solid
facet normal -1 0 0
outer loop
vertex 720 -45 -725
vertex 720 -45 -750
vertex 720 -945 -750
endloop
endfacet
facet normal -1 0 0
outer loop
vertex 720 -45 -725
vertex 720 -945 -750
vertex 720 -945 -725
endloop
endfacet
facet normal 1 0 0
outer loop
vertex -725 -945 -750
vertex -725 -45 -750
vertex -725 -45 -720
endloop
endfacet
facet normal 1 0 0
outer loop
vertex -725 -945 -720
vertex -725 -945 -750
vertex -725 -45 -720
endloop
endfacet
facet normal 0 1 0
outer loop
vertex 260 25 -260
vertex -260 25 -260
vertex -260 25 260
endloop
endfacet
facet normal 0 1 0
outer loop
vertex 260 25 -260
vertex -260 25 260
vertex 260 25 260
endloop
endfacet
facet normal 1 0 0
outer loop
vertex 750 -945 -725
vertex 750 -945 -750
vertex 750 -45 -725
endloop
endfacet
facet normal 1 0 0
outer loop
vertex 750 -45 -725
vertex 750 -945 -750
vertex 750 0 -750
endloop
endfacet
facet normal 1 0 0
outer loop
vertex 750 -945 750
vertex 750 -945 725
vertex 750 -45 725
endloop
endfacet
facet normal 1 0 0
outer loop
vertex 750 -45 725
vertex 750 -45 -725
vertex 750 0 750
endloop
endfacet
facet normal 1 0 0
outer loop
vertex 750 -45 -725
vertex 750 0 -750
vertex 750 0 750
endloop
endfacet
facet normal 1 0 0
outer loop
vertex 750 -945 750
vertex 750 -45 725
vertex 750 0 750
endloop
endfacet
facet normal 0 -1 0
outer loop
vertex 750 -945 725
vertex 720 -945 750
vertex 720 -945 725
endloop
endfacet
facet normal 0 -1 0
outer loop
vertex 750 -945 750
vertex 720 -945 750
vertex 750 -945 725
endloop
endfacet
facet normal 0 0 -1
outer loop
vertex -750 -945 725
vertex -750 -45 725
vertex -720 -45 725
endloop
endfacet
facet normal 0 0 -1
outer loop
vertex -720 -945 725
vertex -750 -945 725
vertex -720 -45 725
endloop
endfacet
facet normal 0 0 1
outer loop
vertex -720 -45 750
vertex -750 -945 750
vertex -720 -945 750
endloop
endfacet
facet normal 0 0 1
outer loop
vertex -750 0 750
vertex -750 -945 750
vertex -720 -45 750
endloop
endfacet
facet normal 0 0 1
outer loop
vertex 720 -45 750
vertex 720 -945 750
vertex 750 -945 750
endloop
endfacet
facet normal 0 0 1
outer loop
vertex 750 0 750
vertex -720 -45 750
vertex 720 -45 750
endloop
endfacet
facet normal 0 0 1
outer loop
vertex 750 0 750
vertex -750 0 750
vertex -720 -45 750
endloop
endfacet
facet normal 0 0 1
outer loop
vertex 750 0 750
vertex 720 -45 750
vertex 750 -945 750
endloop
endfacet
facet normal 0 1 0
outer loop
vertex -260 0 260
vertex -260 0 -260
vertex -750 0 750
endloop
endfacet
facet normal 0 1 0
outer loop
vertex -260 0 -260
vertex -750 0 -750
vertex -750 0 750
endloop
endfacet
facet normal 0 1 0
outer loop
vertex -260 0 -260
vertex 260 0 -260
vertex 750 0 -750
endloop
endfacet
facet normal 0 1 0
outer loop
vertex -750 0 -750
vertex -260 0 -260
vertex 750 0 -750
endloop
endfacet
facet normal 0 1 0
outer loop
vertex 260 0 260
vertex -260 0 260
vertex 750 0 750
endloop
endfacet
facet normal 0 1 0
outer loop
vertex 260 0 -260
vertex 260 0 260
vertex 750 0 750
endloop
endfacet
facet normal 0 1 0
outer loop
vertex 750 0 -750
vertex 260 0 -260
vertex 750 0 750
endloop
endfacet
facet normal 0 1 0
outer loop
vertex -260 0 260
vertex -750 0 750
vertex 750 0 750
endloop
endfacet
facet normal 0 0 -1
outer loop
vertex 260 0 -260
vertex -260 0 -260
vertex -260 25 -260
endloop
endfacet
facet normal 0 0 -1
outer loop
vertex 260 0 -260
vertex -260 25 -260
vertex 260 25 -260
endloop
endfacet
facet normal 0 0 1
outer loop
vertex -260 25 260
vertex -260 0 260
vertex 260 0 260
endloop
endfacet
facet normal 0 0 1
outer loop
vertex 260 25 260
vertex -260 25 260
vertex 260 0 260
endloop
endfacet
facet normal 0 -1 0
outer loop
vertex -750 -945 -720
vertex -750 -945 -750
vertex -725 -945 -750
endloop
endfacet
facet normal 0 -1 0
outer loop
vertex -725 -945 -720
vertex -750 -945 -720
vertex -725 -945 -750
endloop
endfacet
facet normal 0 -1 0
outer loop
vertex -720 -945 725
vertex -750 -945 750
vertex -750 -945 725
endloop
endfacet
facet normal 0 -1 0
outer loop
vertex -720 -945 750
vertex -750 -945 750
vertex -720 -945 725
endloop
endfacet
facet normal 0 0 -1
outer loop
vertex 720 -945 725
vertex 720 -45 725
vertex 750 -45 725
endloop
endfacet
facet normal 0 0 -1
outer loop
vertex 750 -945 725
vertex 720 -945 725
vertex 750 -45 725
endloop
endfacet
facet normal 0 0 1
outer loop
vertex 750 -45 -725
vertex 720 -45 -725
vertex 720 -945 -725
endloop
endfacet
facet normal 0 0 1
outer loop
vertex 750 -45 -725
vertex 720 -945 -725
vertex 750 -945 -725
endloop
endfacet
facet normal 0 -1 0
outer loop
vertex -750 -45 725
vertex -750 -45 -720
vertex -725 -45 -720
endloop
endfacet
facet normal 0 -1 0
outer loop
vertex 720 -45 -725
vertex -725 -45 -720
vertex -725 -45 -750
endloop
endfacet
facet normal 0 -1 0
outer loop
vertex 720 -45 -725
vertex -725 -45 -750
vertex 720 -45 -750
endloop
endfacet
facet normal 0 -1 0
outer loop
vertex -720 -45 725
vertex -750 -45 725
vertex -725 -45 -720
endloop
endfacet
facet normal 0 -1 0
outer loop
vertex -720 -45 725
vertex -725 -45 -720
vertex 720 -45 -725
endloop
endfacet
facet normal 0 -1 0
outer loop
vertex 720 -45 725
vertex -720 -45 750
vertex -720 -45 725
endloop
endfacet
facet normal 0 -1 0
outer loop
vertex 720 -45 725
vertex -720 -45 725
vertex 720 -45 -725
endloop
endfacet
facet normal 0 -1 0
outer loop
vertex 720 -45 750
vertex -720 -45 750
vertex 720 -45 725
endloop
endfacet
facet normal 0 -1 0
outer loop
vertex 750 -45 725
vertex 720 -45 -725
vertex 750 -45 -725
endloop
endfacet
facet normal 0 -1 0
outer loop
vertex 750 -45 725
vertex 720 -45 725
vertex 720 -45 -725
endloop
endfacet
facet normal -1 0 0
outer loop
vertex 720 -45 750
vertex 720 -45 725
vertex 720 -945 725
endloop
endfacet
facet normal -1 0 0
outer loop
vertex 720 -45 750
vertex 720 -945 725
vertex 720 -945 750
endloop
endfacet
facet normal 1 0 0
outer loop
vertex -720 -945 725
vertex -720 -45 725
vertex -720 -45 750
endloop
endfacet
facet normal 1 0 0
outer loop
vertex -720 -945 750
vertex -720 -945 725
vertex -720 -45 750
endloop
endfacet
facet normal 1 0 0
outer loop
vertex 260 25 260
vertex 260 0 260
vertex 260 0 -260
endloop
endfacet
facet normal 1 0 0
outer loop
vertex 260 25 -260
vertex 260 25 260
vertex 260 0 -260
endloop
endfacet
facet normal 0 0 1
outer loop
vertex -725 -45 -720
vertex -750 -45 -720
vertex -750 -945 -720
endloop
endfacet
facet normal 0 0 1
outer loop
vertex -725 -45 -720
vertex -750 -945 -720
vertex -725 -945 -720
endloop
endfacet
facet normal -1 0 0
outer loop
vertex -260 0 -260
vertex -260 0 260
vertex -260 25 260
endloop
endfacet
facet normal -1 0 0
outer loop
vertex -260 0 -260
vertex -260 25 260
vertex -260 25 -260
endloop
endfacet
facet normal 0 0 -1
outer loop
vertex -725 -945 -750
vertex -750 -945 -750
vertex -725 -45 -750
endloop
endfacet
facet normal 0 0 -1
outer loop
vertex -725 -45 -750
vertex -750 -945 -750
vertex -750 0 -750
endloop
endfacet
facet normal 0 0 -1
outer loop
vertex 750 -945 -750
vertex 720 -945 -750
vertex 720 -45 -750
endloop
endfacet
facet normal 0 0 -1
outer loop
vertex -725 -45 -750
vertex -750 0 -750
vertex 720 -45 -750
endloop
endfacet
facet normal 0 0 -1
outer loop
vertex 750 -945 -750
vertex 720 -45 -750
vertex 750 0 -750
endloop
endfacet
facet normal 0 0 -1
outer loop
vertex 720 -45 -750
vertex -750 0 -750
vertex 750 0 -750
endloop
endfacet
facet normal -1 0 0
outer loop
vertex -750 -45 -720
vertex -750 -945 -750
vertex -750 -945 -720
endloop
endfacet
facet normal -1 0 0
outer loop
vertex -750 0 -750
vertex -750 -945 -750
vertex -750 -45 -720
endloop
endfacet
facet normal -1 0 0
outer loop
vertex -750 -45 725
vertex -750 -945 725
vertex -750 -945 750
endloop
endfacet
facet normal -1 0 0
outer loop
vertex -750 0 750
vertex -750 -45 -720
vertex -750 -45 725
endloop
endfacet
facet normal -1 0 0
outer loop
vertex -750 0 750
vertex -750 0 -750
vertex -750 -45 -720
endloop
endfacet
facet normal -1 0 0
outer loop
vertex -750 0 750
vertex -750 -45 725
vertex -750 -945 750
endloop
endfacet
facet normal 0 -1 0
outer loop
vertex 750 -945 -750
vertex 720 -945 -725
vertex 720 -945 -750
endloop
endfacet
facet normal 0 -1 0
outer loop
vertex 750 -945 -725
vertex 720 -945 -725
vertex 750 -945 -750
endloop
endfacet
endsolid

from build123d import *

# Parameters (mm, degrees)
SKETCH1_W           = 520
SKETCH1_H           = 520
BOSS_EXTRUDE1_DEPTH = 25
SKETCH2_W           = 1500
SKETCH2_H           = 1500
BOSS_EXTRUDE2_DEPTH = 45
SKETCH3_W           = 30
SKETCH3_H           = 25
BOSS_EXTRUDE3_DEPTH = 900
SKETCH4_W           = 30
SKETCH4_H           = 25
BOSS_EXTRUDE4_DEPTH = 900
SKETCH5_W           = 30
SKETCH5_H           = 25
BOSS_EXTRUDE5_DEPTH = 900
SKETCH6_W           = 25
SKETCH6_H           = 30
BOSS_EXTRUDE6_DEPTH = 900


with BuildPart() as part:
    # Sketch1 → Boss-Extrude1 (new body)
    with BuildSketch(Plane(origin=(0, 0, 0), x_dir=(1, 0, 0), z_dir=(0, 1, 0))):
        Rectangle(SKETCH1_W, SKETCH1_H)
    extrude(amount=BOSS_EXTRUDE1_DEPTH)

    # Sketch2 → Boss-Extrude2 (add)
    with BuildSketch(Plane.XZ):
        Rectangle(SKETCH2_W, SKETCH2_H)
    extrude(amount=BOSS_EXTRUDE2_DEPTH)

    # Sketch3 → Boss-Extrude3 (add)
    with BuildSketch(Plane.XZ.offset(45)):
        with Locations((735, 737.5)):
            Rectangle(SKETCH3_W, SKETCH3_H)
    extrude(amount=BOSS_EXTRUDE3_DEPTH)

    # Sketch4 → Boss-Extrude4 (add)
    with BuildSketch(Plane.XZ.offset(45)):
        with Locations((-735, 737.5)):
            Rectangle(SKETCH4_W, SKETCH4_H)
    extrude(amount=BOSS_EXTRUDE4_DEPTH)

    # Sketch5 → Boss-Extrude5 (add)
    with BuildSketch(Plane.XZ.offset(45)):
        with Locations((735, -737.5)):
            Rectangle(SKETCH5_W, SKETCH5_H)
    extrude(amount=BOSS_EXTRUDE5_DEPTH)

    # Sketch6 → Boss-Extrude6 (add)
    with BuildSketch(Plane.XZ.offset(45)):
        with Locations((-737.5, -735)):
            Rectangle(SKETCH6_W, SKETCH6_H)
    extrude(amount=BOSS_EXTRUDE6_DEPTH)


solid = part.part
